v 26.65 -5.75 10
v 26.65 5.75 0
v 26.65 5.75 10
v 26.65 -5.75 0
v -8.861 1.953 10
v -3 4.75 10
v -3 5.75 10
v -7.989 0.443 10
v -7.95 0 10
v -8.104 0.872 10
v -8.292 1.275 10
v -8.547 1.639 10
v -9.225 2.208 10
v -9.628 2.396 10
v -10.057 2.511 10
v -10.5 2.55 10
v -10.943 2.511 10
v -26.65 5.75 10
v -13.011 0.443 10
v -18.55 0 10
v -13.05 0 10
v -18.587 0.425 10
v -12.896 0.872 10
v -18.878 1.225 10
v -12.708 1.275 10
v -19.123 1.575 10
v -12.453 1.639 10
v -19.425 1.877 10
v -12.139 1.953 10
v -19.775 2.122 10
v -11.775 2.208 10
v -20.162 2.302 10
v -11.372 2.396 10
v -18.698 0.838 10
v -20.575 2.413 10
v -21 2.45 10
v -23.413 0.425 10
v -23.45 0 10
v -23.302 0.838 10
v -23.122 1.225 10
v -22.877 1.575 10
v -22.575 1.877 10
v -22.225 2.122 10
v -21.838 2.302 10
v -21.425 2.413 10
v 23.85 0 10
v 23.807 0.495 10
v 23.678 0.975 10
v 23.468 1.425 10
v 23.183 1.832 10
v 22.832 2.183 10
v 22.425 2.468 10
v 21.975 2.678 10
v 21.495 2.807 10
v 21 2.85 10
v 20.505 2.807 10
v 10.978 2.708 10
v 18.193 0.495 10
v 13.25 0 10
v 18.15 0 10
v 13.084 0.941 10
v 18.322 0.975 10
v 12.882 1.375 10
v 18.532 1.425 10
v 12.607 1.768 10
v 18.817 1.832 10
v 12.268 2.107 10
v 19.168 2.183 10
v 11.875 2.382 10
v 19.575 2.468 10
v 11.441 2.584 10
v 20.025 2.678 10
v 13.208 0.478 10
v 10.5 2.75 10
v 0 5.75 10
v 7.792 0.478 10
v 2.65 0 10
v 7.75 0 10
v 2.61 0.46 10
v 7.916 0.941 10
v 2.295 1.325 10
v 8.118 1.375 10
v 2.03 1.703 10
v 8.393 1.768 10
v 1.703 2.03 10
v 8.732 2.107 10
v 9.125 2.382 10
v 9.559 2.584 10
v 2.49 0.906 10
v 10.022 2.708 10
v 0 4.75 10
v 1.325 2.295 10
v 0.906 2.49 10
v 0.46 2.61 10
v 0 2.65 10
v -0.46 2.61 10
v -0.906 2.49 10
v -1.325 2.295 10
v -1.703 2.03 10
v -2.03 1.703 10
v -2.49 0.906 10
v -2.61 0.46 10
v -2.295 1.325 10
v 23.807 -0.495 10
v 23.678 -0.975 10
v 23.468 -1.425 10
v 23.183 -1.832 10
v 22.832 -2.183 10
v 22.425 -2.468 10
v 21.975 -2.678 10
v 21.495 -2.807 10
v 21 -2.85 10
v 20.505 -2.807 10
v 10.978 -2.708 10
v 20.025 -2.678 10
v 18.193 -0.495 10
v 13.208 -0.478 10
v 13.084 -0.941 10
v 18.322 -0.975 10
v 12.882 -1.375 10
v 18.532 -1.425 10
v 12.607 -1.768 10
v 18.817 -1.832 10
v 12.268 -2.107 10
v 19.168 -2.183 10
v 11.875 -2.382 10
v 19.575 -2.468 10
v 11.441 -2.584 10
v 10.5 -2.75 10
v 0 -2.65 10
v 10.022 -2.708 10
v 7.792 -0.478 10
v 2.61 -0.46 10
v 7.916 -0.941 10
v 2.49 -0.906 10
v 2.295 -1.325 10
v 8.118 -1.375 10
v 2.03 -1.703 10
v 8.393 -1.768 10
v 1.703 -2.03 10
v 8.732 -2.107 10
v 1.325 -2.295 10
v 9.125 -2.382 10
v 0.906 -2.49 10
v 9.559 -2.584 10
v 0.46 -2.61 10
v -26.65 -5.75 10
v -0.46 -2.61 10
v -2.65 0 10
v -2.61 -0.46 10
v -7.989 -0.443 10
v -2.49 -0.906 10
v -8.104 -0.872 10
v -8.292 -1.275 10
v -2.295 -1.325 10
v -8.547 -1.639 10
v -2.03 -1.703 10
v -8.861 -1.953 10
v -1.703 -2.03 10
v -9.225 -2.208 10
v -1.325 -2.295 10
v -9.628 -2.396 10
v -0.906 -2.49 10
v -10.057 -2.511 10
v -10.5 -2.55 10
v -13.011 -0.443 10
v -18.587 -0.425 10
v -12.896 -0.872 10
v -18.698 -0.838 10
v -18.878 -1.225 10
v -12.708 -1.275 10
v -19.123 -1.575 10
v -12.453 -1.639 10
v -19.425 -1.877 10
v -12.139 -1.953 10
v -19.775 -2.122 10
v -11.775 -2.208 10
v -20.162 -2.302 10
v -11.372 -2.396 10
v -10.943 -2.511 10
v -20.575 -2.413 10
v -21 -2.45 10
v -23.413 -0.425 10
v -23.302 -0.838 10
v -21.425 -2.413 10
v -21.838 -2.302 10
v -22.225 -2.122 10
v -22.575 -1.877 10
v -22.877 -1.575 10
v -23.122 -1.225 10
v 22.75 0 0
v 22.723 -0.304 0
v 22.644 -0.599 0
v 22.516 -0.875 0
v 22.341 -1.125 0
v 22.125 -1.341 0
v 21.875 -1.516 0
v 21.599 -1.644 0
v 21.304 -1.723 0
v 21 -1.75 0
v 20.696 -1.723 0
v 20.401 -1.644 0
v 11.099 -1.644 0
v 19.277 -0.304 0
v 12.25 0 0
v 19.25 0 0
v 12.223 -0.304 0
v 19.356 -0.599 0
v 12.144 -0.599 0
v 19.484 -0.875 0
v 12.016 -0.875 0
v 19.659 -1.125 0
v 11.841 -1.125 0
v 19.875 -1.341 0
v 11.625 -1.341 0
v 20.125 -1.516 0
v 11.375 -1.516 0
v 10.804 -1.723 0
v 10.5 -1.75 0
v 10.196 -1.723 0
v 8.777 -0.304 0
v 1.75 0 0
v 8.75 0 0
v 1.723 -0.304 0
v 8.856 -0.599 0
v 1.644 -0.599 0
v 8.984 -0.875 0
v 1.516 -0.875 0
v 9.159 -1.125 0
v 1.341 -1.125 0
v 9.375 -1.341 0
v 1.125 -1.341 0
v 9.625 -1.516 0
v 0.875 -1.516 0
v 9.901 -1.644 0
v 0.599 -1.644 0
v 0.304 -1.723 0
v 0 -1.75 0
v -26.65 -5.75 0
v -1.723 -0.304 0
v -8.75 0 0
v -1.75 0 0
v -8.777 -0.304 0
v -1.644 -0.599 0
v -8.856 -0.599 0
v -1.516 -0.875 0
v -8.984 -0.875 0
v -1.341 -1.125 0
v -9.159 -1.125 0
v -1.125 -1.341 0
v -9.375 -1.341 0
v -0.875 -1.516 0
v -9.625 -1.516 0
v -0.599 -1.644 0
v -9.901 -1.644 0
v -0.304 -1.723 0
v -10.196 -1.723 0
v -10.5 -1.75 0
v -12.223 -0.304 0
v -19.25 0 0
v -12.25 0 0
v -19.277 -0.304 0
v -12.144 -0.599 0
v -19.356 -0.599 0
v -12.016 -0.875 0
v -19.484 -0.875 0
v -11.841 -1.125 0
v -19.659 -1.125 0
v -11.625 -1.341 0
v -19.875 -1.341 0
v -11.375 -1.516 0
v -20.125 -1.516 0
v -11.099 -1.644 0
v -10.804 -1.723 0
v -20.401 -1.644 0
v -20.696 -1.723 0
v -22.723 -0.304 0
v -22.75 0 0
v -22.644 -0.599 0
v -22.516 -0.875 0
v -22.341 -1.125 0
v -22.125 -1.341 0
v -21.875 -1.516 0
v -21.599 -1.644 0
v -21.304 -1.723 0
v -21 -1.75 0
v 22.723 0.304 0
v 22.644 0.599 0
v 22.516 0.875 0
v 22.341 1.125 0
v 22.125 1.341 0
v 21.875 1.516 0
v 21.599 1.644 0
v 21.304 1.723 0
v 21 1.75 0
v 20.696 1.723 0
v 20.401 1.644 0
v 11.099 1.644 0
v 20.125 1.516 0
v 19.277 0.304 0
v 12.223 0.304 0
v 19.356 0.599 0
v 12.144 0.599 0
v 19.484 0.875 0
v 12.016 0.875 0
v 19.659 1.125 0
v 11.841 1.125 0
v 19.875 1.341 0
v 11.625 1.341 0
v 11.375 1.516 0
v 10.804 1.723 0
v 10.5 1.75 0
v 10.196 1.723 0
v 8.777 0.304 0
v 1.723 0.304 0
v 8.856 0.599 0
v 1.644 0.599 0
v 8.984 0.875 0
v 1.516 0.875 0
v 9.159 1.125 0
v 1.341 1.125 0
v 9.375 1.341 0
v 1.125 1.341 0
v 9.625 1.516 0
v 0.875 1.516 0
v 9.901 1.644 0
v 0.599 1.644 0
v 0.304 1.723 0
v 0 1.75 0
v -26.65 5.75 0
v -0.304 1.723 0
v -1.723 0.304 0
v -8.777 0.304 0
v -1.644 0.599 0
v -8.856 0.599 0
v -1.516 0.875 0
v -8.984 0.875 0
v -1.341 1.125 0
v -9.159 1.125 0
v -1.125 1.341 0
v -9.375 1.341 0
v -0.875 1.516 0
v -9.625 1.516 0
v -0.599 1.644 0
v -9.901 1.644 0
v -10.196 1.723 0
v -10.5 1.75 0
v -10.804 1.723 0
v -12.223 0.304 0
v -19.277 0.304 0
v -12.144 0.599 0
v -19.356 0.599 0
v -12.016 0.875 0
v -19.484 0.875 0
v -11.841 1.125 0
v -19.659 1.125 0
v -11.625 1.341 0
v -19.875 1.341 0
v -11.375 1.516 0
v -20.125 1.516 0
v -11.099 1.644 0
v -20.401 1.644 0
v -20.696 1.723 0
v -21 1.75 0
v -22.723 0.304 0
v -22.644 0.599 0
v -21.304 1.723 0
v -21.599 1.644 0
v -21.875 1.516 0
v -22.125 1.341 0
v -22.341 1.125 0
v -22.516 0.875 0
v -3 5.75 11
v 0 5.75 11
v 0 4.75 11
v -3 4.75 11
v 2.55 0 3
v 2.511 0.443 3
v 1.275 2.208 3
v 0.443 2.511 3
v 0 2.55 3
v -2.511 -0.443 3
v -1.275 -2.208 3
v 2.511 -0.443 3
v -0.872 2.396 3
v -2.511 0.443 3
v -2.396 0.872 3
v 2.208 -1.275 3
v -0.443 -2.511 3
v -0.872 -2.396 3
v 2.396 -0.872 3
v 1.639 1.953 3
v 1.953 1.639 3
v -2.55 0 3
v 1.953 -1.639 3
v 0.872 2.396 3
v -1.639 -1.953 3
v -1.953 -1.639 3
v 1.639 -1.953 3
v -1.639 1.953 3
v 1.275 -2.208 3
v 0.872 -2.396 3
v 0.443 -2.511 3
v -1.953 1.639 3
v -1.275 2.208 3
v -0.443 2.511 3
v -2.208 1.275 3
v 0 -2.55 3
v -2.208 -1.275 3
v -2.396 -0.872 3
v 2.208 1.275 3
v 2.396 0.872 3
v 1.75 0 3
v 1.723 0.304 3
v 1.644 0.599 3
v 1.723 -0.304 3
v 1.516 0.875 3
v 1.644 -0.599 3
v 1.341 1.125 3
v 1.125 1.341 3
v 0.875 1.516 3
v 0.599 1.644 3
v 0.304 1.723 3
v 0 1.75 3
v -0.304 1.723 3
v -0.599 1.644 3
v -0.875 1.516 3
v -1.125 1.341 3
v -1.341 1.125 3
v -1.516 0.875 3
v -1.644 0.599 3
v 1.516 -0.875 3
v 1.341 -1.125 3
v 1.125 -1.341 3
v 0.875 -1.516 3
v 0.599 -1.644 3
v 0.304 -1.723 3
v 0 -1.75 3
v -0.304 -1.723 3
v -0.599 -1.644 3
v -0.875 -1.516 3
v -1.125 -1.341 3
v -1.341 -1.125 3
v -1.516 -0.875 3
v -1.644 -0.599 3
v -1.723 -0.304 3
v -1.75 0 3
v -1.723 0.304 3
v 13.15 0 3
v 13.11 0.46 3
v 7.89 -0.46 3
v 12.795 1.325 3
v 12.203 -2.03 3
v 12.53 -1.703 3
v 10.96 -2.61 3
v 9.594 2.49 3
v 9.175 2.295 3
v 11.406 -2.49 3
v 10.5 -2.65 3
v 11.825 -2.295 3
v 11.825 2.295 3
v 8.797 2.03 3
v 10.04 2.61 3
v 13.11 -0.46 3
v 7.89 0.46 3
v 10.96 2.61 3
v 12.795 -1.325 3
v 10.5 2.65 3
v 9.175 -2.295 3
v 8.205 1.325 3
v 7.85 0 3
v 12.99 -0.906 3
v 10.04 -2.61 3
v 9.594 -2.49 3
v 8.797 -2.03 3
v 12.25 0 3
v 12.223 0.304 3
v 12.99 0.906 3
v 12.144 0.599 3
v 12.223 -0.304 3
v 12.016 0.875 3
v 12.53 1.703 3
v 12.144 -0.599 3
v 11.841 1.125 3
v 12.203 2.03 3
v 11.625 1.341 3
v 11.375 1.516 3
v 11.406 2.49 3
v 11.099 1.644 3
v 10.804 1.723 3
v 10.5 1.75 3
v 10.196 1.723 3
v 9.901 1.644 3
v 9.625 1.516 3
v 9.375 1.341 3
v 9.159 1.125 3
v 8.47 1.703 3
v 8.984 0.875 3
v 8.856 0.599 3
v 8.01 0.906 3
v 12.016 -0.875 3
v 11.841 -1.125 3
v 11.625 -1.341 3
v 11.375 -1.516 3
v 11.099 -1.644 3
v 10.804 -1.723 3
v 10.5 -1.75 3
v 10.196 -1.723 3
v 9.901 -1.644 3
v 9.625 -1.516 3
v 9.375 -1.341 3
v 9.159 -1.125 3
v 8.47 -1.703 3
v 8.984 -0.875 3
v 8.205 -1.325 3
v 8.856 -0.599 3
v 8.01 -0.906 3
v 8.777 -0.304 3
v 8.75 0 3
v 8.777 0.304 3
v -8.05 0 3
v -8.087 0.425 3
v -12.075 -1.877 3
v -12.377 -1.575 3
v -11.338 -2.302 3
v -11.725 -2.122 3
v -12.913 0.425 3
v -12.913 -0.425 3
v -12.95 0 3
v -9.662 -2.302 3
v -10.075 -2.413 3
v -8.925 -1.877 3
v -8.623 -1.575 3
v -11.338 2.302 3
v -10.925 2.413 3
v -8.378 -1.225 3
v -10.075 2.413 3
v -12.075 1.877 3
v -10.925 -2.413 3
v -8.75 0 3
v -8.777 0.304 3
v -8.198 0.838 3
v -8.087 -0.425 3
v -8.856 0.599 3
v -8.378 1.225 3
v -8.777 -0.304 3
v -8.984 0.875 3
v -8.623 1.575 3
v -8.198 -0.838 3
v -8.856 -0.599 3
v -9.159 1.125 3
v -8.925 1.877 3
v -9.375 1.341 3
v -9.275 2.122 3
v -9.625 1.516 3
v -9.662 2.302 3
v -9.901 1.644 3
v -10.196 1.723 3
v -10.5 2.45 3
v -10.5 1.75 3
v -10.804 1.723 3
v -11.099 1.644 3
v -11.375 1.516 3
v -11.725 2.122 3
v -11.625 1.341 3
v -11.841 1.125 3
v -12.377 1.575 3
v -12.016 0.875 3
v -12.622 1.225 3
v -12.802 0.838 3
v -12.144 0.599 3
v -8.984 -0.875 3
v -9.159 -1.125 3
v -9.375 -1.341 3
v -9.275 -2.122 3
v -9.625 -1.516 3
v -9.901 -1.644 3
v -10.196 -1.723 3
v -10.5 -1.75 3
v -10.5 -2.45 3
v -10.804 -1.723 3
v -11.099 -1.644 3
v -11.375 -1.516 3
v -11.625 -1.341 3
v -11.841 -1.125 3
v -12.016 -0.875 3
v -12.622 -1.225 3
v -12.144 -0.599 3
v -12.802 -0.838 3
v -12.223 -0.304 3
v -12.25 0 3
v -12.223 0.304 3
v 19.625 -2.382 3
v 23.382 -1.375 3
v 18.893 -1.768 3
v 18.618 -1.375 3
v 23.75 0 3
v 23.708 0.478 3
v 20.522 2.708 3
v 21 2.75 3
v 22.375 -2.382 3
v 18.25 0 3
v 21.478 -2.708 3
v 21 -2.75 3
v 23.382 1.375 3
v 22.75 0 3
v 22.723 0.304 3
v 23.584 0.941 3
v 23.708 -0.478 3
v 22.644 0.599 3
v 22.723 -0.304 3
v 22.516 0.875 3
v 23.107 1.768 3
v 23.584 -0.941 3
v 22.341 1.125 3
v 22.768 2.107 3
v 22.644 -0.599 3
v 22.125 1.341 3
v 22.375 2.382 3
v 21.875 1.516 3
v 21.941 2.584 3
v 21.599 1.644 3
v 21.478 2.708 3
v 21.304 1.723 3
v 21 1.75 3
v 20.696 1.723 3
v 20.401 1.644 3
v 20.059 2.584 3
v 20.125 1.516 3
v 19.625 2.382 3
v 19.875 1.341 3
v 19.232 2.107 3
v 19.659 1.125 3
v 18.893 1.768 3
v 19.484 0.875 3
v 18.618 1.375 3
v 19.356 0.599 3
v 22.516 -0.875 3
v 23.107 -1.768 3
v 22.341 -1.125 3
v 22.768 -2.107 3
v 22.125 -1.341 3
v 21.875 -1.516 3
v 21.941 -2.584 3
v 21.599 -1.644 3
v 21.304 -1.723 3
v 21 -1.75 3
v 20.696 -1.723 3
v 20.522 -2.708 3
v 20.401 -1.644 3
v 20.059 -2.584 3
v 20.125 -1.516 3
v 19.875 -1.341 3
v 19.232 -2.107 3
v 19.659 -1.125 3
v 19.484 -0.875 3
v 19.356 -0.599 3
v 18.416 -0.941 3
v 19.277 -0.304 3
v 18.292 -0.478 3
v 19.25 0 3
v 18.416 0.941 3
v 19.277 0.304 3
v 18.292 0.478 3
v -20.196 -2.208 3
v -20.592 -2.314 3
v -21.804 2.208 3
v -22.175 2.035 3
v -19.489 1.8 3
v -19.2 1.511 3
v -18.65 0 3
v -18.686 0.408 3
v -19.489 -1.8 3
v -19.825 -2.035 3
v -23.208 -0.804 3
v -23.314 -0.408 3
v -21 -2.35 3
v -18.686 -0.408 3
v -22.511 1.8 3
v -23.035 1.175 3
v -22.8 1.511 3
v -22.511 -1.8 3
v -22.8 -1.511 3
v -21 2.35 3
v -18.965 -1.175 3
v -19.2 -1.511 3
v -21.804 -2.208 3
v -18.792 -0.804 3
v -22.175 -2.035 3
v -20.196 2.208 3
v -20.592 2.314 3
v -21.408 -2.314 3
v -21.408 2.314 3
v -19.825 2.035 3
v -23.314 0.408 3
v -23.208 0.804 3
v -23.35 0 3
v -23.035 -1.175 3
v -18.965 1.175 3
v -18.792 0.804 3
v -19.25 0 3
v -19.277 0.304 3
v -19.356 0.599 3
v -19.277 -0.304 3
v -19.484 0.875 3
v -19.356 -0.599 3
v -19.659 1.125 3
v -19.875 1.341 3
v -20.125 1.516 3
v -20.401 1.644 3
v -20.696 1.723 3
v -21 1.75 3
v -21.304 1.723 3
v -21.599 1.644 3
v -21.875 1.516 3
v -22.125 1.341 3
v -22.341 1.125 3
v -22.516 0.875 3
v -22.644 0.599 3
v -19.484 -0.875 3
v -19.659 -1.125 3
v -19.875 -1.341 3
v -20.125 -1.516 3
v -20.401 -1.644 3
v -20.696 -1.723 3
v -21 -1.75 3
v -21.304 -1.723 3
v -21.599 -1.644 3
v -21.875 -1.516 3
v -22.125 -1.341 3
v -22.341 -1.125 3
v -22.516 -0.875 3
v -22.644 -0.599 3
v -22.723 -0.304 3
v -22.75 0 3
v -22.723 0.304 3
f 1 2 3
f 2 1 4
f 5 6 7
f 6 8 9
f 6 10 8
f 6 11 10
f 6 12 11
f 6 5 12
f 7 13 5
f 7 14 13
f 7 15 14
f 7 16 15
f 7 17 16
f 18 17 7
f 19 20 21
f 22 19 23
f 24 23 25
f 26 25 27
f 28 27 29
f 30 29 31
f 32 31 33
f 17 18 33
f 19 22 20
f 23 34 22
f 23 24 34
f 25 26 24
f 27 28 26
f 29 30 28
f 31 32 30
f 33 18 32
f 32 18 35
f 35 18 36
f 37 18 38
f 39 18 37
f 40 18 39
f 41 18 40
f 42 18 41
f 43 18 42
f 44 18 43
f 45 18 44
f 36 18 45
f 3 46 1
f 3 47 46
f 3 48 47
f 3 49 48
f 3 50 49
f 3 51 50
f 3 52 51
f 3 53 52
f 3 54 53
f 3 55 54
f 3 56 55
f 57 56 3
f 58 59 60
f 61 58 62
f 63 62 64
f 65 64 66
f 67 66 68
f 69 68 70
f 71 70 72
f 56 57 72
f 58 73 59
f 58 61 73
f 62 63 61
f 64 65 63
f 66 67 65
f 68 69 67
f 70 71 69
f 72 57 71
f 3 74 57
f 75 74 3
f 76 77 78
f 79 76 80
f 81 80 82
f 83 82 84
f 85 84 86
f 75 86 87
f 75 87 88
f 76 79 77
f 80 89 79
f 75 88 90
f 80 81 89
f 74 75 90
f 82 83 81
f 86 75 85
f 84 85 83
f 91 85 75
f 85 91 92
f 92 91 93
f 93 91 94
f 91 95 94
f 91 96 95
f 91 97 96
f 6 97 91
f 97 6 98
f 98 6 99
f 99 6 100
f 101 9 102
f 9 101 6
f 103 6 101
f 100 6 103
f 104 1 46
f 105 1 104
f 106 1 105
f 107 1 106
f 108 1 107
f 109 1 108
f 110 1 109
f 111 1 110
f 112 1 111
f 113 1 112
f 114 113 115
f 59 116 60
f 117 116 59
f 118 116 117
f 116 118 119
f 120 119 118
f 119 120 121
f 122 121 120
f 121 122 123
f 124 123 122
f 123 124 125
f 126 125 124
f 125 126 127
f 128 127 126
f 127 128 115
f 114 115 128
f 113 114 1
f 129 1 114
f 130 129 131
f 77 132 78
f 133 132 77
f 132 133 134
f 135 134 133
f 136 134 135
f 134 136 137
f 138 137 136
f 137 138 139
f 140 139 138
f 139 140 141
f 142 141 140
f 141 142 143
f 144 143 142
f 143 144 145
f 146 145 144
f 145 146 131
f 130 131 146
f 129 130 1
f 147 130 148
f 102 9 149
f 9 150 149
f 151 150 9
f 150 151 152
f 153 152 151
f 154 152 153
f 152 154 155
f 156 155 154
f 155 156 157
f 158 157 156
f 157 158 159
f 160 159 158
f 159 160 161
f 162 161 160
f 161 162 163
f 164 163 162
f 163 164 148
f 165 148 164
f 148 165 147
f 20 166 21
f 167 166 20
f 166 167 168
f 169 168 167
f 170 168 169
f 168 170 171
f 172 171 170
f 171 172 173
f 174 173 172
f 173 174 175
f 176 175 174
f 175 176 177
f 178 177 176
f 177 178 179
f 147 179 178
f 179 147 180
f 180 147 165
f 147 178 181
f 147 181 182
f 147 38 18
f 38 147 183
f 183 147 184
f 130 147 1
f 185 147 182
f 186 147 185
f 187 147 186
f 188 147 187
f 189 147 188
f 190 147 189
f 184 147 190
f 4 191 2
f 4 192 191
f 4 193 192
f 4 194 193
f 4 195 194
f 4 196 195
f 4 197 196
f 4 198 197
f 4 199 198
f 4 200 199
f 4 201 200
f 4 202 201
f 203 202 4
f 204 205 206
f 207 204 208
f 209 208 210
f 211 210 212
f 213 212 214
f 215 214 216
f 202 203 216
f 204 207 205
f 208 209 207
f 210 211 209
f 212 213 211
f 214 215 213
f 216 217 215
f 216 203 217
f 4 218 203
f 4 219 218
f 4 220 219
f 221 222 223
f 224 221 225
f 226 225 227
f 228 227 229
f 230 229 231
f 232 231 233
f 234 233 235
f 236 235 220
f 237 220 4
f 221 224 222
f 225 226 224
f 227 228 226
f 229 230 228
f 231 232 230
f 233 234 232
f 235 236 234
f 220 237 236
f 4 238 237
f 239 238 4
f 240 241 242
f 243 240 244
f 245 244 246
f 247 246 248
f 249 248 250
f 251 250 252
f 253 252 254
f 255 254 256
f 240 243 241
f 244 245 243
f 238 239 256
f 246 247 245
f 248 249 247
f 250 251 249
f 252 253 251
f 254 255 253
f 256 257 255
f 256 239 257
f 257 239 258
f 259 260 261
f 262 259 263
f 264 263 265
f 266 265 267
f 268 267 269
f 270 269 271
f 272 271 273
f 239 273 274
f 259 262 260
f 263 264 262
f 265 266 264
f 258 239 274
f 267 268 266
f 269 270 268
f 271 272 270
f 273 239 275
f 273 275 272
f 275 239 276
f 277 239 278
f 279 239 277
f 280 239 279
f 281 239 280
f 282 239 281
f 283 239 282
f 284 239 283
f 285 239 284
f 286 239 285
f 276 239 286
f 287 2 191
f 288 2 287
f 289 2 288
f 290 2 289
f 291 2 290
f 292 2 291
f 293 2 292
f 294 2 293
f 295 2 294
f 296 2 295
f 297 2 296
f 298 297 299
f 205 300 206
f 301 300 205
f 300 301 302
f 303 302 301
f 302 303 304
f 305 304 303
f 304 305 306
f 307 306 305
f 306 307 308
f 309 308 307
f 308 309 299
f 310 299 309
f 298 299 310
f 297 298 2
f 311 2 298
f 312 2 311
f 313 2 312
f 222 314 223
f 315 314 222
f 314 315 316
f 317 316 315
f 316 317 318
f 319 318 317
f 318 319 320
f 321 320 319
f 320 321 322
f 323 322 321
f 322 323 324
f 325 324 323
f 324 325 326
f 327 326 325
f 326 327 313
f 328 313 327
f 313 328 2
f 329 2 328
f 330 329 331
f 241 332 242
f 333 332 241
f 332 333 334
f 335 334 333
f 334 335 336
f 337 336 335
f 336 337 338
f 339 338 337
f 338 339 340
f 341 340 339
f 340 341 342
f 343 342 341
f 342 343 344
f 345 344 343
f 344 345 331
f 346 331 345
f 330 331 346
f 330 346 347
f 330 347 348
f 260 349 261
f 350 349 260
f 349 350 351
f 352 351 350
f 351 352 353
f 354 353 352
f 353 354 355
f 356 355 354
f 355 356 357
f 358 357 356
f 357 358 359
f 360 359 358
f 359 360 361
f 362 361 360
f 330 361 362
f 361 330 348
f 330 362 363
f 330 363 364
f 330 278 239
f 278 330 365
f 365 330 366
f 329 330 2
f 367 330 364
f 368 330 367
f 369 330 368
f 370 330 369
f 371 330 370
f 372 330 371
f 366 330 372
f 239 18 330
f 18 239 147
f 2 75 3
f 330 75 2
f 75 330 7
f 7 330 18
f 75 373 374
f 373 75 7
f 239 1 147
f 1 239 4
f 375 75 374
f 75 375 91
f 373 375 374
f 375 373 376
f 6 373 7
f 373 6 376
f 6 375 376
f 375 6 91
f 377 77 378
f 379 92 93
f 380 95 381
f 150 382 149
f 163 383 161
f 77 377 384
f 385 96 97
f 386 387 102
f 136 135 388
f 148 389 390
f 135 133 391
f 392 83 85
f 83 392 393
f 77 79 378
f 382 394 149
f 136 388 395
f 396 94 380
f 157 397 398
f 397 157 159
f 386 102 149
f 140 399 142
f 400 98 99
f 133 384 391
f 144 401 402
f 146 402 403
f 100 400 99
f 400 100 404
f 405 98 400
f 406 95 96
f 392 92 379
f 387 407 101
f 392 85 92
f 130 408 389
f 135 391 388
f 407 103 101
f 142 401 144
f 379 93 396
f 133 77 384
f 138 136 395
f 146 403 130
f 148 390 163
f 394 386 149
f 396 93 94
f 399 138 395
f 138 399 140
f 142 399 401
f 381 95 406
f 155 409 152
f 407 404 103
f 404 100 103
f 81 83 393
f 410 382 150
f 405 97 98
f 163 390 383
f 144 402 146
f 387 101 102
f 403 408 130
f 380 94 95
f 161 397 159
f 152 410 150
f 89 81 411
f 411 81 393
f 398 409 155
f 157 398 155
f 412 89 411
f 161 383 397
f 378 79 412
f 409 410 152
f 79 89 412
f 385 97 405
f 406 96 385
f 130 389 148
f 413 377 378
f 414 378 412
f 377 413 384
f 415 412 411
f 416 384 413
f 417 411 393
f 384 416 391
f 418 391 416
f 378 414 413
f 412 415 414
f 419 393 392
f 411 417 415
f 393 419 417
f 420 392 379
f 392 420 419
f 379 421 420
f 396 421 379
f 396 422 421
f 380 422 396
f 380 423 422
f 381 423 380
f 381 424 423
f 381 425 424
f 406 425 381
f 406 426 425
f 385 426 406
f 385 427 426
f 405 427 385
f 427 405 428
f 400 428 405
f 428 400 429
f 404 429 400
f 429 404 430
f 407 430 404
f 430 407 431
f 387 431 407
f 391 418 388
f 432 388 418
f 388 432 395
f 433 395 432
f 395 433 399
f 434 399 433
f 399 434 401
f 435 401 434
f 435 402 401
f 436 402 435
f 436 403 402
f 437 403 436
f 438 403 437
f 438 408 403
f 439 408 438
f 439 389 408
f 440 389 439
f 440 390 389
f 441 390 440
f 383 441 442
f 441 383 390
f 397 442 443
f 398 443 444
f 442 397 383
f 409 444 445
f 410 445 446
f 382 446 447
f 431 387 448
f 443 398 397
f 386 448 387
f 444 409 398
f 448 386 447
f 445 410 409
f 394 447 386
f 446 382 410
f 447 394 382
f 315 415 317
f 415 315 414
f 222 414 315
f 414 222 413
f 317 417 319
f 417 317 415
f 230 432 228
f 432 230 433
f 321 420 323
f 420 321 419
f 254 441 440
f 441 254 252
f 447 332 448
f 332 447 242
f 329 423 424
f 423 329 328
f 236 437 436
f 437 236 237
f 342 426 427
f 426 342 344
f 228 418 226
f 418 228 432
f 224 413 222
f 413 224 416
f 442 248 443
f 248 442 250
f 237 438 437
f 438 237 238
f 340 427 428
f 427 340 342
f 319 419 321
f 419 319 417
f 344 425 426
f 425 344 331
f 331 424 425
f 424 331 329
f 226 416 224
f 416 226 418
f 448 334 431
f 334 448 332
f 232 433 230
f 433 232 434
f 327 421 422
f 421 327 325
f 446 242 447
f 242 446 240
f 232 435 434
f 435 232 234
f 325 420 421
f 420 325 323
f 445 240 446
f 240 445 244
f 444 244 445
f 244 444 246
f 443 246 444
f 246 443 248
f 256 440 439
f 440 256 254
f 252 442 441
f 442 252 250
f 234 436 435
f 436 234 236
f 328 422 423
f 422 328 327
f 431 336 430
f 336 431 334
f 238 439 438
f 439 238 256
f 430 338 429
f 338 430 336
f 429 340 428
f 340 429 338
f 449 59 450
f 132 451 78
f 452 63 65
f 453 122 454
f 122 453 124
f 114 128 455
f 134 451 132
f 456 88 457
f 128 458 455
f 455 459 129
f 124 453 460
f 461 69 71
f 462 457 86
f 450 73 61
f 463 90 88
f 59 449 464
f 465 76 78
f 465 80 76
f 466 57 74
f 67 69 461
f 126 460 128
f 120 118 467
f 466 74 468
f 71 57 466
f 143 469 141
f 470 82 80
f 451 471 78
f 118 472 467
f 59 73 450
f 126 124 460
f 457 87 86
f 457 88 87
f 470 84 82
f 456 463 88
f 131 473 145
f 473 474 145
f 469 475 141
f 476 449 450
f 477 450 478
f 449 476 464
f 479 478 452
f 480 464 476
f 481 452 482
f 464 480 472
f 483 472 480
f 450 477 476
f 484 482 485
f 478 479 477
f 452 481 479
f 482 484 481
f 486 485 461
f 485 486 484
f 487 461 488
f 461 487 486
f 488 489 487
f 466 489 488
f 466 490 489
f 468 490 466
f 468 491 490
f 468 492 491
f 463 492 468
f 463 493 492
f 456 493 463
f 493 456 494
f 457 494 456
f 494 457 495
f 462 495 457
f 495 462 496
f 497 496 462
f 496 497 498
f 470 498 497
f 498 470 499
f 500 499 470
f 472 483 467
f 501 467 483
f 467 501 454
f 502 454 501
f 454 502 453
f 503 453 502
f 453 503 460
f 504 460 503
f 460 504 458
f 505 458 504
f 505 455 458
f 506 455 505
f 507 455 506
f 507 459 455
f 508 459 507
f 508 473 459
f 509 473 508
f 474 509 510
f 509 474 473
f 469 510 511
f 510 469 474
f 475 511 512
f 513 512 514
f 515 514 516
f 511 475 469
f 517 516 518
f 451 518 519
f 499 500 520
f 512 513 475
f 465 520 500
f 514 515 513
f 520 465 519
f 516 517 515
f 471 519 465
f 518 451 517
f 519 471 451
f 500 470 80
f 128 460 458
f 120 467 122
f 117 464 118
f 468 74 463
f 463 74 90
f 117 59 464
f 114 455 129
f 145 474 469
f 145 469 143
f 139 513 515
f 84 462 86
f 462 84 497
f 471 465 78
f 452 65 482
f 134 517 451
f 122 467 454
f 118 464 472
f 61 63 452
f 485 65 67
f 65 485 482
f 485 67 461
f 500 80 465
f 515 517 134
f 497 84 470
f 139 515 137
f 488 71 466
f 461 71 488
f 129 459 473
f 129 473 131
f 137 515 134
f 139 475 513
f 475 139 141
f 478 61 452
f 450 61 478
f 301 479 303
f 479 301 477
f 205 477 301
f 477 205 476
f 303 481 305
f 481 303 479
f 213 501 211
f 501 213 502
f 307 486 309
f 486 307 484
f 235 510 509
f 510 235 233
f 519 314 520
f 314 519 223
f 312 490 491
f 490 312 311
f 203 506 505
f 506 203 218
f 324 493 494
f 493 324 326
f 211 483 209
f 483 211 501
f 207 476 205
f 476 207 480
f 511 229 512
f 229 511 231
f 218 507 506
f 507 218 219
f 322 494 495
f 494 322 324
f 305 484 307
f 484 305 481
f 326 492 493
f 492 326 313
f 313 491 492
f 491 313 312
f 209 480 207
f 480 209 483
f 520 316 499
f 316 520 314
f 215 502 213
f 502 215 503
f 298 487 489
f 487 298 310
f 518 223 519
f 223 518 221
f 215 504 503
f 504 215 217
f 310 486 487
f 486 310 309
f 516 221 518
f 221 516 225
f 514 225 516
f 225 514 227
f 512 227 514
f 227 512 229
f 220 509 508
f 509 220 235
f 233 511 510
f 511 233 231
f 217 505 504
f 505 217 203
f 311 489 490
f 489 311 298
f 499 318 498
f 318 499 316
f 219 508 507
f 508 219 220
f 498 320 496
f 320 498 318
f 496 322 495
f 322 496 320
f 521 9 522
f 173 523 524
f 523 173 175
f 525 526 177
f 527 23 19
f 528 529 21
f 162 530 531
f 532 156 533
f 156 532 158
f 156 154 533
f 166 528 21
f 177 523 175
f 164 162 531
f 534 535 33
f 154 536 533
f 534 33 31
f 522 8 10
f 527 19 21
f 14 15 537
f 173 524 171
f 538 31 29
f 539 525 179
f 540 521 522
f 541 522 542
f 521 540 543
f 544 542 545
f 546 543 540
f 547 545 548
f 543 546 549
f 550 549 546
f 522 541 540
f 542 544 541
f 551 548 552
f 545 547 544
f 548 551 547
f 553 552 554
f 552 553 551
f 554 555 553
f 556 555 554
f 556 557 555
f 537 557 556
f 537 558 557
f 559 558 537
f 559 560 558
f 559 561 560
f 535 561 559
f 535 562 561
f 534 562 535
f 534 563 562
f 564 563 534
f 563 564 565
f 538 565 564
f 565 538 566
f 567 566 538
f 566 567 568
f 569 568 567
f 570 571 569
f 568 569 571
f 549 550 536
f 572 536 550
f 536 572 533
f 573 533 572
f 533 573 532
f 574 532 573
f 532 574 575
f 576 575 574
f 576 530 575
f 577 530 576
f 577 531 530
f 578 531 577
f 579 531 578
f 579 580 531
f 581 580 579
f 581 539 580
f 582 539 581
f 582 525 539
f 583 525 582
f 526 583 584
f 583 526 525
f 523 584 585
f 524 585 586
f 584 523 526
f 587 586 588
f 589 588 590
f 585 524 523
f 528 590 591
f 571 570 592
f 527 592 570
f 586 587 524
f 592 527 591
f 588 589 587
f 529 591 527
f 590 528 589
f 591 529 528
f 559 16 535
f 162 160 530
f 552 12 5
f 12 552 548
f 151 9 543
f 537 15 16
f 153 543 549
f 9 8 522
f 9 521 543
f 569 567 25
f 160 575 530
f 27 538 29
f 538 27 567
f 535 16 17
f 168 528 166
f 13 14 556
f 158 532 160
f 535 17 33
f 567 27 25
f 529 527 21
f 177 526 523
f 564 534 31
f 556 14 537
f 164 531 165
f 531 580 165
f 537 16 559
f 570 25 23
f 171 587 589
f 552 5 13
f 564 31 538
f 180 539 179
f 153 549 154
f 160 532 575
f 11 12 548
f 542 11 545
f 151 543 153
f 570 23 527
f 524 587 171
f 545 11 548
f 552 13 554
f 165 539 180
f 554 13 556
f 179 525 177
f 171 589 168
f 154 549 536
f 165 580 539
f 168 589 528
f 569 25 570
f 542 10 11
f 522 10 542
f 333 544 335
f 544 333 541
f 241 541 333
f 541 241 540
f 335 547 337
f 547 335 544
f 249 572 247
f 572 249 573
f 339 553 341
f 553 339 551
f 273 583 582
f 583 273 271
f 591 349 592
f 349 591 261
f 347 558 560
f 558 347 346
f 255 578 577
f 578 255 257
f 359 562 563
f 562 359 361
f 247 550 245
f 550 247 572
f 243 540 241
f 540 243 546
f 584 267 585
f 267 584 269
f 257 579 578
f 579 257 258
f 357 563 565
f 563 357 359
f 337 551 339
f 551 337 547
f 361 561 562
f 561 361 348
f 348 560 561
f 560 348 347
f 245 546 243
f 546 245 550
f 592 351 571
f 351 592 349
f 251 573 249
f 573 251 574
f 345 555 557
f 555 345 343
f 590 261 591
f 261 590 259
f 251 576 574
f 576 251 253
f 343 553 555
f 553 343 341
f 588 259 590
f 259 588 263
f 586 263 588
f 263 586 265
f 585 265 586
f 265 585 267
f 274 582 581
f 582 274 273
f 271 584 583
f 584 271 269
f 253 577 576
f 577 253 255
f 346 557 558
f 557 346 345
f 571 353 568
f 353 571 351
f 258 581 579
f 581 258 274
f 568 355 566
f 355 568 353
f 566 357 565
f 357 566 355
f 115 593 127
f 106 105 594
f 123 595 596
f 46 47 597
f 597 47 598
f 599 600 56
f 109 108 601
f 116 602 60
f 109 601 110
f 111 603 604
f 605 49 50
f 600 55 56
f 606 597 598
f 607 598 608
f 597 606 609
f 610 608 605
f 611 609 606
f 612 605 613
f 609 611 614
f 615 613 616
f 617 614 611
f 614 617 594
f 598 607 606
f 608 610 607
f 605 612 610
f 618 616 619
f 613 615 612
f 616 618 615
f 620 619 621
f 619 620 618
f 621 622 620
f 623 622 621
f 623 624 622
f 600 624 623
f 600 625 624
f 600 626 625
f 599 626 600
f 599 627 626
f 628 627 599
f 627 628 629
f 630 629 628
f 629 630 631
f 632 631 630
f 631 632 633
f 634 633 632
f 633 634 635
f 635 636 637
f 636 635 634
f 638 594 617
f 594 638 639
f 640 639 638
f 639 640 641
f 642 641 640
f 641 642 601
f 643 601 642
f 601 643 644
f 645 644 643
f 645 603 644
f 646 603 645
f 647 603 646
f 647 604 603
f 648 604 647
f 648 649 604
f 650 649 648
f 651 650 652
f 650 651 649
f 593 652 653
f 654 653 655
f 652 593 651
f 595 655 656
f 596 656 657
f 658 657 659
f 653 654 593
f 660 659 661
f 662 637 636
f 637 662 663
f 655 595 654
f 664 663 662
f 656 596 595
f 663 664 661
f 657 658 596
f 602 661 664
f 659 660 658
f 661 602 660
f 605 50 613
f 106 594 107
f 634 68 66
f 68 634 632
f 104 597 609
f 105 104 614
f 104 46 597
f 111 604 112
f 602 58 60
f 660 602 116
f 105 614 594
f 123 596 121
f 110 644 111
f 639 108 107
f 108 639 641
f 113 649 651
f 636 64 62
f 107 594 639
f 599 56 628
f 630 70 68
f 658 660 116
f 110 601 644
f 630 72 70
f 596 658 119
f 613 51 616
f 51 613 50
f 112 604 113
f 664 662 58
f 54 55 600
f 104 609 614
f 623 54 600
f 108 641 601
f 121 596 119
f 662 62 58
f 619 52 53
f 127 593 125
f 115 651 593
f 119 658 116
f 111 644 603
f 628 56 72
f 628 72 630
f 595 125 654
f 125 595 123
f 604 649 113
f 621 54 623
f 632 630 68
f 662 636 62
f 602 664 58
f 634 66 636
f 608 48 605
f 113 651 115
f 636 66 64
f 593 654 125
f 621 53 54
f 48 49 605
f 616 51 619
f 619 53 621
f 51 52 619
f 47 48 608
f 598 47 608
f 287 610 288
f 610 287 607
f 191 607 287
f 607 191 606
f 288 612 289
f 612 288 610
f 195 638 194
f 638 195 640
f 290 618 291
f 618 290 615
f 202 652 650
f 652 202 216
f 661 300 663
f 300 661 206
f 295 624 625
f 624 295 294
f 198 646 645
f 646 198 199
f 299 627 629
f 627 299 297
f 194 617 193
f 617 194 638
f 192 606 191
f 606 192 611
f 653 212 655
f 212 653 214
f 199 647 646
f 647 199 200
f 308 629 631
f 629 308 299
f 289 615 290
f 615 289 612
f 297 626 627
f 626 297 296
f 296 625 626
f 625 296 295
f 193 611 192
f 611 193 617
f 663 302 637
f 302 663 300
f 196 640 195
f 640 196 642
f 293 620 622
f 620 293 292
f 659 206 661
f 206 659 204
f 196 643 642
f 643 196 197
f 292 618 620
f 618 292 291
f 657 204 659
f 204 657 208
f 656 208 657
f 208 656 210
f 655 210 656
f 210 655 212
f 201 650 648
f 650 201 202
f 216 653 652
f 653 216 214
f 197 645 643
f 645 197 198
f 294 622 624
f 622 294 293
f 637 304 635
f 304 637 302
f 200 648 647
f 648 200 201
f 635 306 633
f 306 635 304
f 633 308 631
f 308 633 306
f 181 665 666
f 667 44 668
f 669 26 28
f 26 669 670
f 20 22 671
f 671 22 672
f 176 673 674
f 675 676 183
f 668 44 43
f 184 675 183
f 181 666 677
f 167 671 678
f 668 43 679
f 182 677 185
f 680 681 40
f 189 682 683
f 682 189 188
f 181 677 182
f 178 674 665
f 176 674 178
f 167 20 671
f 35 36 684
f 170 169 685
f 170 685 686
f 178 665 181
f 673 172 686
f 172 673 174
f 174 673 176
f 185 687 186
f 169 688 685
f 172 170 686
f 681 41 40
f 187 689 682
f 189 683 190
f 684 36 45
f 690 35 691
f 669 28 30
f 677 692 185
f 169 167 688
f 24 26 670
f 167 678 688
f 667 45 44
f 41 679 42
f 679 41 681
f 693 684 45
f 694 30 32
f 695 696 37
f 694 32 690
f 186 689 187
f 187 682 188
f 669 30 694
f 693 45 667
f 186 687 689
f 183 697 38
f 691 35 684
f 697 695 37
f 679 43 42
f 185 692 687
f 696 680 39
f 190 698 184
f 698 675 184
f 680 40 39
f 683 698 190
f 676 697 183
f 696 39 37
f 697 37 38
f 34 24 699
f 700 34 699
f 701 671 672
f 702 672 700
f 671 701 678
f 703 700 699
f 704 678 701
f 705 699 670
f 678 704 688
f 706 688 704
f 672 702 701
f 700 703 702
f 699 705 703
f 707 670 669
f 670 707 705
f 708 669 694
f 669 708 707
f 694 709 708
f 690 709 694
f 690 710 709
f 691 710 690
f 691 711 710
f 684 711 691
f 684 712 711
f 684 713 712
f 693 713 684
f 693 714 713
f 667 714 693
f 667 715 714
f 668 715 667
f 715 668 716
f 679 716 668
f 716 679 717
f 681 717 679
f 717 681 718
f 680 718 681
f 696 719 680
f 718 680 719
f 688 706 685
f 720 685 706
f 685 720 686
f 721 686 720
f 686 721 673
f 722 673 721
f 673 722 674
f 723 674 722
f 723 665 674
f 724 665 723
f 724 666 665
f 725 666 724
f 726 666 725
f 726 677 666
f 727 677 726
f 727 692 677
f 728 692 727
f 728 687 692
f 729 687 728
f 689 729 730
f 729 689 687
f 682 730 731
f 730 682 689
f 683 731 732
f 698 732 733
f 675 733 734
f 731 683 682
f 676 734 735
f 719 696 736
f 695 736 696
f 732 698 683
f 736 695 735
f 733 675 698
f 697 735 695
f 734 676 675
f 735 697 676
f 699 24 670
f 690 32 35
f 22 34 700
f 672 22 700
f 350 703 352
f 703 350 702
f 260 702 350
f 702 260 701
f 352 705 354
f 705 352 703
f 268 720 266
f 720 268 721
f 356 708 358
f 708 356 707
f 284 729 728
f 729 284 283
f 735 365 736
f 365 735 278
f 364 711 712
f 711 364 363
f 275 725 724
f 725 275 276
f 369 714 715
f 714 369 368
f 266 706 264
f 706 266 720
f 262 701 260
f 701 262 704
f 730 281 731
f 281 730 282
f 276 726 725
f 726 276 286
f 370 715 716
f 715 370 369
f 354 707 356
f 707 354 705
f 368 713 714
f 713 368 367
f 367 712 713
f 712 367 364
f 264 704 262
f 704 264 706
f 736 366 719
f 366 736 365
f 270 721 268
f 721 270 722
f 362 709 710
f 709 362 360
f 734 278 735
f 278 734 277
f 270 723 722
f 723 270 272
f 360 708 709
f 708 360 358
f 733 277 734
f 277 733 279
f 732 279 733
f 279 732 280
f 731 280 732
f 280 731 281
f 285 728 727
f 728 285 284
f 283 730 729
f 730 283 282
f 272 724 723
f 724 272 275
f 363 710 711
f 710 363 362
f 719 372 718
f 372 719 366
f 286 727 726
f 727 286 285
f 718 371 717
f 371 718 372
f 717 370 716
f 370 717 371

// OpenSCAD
//heat insert tester
//justin lowe 20201209

//this initial round of testing is for 5mm tall, 5.3mm diameter m3 screw inserts, specifically:
//uxcell a16041800ux0827 M3 x 5mm x 5.3mm Brass Cylindrical Knurled Threaded Insert

draftingFNs = 36;
renderFNs = 180;
$fn = draftingFNs;

insertHeight = 5;
insertDiameter = 5.3;
voidMedianDiameter = 5.3; //set to insert diameter to have large and smaller holes, or set to custom value to, you know, have a hole of a custom diamter as the central/starting point
voidMedianRadius = voidMedianDiameter/2;

voidBottomWall = 3; //how much material to have under the void
voidHorizontalDistance = 5; //how much space between holes - ugh set this large enough to deal with incrementing hole size (because I dont want to deal with varying translation size)
voidHorizontalWall = 3; //space between wall and edge of cube
voidVerticalPadding = 2; //how much higher to make hole than the insert's height - hmm see things online suggesting up to 50% of insert height
voidVerticalRadiusTaper = 0.1; //have bottom of void be this much smaller in raidu (uniformly for all voids)

voidsBracketingNumber = 2; //how many test holes to make on the plus & minus size of starting hole
radiusIncrement = 0.1;

screwHoles = true;
screwHoleDiameter = 3.5; //m3 = 3mm diameter
screwRadius = screwHoleDiameter/2;

difference(){
    union(){
        //cube for voids to be subtracted from
        translate([0,0,(insertHeight+voidVerticalPadding+voidBottomWall)/2]){
            cube([voidHorizontalWall+insertDiameter+(2*voidsBracketingNumber*insertDiameter)+(2*voidsBracketingNumber*radiusIncrement*2)+(2*voidsBracketingNumber*voidHorizontalDistance)+voidHorizontalWall,voidHorizontalWall+(insertDiameter+(voidsBracketingNumber*radiusIncrement))+voidHorizontalWall,insertHeight+voidVerticalPadding+voidBottomWall],true);
        }
        
        //make a - sign to signify smaller and larger diameters
        translate([-3,(voidHorizontalWall+(insertDiameter+(voidsBracketingNumber*radiusIncrement))+voidHorizontalWall)/2-1,(insertHeight+voidVerticalPadding+voidBottomWall)]){
            cube([3,1,1]);
        }
    }

    //make voids
    for (i=[0:voidsBracketingNumber]){
        translate([i*voidHorizontalDistance+i*voidMedianRadius*2+(i*radiusIncrement*2),0,voidBottomWall]){
            cylinder(insertHeight+voidVerticalPadding,voidMedianRadius+(i*radiusIncrement)-voidVerticalRadiusTaper,voidMedianRadius+(i*radiusIncrement));
            if (screwHoles){
                translate([0,0,-voidBottomWall]){
                    cylinder(voidBottomWall,screwRadius,screwRadius);
                }
            }
        }
        


        //also create negative bracketing voids (if not the central starting hole)
        if (i > 0){ 
            translate([-i*voidHorizontalDistance-i*voidMedianRadius*2+(-i*radiusIncrement*2),0,voidBottomWall]){
                cylinder(insertHeight+voidVerticalPadding,voidMedianRadius+(-i*radiusIncrement)-voidVerticalRadiusTaper,voidMedianRadius+(-i*radiusIncrement));
                if (screwHoles){
                    translate([0,0,-voidBottomWall]){
                        cylinder(voidBottomWall,screwRadius,screwRadius);
                    }
                }
            }
        }
    }
}
